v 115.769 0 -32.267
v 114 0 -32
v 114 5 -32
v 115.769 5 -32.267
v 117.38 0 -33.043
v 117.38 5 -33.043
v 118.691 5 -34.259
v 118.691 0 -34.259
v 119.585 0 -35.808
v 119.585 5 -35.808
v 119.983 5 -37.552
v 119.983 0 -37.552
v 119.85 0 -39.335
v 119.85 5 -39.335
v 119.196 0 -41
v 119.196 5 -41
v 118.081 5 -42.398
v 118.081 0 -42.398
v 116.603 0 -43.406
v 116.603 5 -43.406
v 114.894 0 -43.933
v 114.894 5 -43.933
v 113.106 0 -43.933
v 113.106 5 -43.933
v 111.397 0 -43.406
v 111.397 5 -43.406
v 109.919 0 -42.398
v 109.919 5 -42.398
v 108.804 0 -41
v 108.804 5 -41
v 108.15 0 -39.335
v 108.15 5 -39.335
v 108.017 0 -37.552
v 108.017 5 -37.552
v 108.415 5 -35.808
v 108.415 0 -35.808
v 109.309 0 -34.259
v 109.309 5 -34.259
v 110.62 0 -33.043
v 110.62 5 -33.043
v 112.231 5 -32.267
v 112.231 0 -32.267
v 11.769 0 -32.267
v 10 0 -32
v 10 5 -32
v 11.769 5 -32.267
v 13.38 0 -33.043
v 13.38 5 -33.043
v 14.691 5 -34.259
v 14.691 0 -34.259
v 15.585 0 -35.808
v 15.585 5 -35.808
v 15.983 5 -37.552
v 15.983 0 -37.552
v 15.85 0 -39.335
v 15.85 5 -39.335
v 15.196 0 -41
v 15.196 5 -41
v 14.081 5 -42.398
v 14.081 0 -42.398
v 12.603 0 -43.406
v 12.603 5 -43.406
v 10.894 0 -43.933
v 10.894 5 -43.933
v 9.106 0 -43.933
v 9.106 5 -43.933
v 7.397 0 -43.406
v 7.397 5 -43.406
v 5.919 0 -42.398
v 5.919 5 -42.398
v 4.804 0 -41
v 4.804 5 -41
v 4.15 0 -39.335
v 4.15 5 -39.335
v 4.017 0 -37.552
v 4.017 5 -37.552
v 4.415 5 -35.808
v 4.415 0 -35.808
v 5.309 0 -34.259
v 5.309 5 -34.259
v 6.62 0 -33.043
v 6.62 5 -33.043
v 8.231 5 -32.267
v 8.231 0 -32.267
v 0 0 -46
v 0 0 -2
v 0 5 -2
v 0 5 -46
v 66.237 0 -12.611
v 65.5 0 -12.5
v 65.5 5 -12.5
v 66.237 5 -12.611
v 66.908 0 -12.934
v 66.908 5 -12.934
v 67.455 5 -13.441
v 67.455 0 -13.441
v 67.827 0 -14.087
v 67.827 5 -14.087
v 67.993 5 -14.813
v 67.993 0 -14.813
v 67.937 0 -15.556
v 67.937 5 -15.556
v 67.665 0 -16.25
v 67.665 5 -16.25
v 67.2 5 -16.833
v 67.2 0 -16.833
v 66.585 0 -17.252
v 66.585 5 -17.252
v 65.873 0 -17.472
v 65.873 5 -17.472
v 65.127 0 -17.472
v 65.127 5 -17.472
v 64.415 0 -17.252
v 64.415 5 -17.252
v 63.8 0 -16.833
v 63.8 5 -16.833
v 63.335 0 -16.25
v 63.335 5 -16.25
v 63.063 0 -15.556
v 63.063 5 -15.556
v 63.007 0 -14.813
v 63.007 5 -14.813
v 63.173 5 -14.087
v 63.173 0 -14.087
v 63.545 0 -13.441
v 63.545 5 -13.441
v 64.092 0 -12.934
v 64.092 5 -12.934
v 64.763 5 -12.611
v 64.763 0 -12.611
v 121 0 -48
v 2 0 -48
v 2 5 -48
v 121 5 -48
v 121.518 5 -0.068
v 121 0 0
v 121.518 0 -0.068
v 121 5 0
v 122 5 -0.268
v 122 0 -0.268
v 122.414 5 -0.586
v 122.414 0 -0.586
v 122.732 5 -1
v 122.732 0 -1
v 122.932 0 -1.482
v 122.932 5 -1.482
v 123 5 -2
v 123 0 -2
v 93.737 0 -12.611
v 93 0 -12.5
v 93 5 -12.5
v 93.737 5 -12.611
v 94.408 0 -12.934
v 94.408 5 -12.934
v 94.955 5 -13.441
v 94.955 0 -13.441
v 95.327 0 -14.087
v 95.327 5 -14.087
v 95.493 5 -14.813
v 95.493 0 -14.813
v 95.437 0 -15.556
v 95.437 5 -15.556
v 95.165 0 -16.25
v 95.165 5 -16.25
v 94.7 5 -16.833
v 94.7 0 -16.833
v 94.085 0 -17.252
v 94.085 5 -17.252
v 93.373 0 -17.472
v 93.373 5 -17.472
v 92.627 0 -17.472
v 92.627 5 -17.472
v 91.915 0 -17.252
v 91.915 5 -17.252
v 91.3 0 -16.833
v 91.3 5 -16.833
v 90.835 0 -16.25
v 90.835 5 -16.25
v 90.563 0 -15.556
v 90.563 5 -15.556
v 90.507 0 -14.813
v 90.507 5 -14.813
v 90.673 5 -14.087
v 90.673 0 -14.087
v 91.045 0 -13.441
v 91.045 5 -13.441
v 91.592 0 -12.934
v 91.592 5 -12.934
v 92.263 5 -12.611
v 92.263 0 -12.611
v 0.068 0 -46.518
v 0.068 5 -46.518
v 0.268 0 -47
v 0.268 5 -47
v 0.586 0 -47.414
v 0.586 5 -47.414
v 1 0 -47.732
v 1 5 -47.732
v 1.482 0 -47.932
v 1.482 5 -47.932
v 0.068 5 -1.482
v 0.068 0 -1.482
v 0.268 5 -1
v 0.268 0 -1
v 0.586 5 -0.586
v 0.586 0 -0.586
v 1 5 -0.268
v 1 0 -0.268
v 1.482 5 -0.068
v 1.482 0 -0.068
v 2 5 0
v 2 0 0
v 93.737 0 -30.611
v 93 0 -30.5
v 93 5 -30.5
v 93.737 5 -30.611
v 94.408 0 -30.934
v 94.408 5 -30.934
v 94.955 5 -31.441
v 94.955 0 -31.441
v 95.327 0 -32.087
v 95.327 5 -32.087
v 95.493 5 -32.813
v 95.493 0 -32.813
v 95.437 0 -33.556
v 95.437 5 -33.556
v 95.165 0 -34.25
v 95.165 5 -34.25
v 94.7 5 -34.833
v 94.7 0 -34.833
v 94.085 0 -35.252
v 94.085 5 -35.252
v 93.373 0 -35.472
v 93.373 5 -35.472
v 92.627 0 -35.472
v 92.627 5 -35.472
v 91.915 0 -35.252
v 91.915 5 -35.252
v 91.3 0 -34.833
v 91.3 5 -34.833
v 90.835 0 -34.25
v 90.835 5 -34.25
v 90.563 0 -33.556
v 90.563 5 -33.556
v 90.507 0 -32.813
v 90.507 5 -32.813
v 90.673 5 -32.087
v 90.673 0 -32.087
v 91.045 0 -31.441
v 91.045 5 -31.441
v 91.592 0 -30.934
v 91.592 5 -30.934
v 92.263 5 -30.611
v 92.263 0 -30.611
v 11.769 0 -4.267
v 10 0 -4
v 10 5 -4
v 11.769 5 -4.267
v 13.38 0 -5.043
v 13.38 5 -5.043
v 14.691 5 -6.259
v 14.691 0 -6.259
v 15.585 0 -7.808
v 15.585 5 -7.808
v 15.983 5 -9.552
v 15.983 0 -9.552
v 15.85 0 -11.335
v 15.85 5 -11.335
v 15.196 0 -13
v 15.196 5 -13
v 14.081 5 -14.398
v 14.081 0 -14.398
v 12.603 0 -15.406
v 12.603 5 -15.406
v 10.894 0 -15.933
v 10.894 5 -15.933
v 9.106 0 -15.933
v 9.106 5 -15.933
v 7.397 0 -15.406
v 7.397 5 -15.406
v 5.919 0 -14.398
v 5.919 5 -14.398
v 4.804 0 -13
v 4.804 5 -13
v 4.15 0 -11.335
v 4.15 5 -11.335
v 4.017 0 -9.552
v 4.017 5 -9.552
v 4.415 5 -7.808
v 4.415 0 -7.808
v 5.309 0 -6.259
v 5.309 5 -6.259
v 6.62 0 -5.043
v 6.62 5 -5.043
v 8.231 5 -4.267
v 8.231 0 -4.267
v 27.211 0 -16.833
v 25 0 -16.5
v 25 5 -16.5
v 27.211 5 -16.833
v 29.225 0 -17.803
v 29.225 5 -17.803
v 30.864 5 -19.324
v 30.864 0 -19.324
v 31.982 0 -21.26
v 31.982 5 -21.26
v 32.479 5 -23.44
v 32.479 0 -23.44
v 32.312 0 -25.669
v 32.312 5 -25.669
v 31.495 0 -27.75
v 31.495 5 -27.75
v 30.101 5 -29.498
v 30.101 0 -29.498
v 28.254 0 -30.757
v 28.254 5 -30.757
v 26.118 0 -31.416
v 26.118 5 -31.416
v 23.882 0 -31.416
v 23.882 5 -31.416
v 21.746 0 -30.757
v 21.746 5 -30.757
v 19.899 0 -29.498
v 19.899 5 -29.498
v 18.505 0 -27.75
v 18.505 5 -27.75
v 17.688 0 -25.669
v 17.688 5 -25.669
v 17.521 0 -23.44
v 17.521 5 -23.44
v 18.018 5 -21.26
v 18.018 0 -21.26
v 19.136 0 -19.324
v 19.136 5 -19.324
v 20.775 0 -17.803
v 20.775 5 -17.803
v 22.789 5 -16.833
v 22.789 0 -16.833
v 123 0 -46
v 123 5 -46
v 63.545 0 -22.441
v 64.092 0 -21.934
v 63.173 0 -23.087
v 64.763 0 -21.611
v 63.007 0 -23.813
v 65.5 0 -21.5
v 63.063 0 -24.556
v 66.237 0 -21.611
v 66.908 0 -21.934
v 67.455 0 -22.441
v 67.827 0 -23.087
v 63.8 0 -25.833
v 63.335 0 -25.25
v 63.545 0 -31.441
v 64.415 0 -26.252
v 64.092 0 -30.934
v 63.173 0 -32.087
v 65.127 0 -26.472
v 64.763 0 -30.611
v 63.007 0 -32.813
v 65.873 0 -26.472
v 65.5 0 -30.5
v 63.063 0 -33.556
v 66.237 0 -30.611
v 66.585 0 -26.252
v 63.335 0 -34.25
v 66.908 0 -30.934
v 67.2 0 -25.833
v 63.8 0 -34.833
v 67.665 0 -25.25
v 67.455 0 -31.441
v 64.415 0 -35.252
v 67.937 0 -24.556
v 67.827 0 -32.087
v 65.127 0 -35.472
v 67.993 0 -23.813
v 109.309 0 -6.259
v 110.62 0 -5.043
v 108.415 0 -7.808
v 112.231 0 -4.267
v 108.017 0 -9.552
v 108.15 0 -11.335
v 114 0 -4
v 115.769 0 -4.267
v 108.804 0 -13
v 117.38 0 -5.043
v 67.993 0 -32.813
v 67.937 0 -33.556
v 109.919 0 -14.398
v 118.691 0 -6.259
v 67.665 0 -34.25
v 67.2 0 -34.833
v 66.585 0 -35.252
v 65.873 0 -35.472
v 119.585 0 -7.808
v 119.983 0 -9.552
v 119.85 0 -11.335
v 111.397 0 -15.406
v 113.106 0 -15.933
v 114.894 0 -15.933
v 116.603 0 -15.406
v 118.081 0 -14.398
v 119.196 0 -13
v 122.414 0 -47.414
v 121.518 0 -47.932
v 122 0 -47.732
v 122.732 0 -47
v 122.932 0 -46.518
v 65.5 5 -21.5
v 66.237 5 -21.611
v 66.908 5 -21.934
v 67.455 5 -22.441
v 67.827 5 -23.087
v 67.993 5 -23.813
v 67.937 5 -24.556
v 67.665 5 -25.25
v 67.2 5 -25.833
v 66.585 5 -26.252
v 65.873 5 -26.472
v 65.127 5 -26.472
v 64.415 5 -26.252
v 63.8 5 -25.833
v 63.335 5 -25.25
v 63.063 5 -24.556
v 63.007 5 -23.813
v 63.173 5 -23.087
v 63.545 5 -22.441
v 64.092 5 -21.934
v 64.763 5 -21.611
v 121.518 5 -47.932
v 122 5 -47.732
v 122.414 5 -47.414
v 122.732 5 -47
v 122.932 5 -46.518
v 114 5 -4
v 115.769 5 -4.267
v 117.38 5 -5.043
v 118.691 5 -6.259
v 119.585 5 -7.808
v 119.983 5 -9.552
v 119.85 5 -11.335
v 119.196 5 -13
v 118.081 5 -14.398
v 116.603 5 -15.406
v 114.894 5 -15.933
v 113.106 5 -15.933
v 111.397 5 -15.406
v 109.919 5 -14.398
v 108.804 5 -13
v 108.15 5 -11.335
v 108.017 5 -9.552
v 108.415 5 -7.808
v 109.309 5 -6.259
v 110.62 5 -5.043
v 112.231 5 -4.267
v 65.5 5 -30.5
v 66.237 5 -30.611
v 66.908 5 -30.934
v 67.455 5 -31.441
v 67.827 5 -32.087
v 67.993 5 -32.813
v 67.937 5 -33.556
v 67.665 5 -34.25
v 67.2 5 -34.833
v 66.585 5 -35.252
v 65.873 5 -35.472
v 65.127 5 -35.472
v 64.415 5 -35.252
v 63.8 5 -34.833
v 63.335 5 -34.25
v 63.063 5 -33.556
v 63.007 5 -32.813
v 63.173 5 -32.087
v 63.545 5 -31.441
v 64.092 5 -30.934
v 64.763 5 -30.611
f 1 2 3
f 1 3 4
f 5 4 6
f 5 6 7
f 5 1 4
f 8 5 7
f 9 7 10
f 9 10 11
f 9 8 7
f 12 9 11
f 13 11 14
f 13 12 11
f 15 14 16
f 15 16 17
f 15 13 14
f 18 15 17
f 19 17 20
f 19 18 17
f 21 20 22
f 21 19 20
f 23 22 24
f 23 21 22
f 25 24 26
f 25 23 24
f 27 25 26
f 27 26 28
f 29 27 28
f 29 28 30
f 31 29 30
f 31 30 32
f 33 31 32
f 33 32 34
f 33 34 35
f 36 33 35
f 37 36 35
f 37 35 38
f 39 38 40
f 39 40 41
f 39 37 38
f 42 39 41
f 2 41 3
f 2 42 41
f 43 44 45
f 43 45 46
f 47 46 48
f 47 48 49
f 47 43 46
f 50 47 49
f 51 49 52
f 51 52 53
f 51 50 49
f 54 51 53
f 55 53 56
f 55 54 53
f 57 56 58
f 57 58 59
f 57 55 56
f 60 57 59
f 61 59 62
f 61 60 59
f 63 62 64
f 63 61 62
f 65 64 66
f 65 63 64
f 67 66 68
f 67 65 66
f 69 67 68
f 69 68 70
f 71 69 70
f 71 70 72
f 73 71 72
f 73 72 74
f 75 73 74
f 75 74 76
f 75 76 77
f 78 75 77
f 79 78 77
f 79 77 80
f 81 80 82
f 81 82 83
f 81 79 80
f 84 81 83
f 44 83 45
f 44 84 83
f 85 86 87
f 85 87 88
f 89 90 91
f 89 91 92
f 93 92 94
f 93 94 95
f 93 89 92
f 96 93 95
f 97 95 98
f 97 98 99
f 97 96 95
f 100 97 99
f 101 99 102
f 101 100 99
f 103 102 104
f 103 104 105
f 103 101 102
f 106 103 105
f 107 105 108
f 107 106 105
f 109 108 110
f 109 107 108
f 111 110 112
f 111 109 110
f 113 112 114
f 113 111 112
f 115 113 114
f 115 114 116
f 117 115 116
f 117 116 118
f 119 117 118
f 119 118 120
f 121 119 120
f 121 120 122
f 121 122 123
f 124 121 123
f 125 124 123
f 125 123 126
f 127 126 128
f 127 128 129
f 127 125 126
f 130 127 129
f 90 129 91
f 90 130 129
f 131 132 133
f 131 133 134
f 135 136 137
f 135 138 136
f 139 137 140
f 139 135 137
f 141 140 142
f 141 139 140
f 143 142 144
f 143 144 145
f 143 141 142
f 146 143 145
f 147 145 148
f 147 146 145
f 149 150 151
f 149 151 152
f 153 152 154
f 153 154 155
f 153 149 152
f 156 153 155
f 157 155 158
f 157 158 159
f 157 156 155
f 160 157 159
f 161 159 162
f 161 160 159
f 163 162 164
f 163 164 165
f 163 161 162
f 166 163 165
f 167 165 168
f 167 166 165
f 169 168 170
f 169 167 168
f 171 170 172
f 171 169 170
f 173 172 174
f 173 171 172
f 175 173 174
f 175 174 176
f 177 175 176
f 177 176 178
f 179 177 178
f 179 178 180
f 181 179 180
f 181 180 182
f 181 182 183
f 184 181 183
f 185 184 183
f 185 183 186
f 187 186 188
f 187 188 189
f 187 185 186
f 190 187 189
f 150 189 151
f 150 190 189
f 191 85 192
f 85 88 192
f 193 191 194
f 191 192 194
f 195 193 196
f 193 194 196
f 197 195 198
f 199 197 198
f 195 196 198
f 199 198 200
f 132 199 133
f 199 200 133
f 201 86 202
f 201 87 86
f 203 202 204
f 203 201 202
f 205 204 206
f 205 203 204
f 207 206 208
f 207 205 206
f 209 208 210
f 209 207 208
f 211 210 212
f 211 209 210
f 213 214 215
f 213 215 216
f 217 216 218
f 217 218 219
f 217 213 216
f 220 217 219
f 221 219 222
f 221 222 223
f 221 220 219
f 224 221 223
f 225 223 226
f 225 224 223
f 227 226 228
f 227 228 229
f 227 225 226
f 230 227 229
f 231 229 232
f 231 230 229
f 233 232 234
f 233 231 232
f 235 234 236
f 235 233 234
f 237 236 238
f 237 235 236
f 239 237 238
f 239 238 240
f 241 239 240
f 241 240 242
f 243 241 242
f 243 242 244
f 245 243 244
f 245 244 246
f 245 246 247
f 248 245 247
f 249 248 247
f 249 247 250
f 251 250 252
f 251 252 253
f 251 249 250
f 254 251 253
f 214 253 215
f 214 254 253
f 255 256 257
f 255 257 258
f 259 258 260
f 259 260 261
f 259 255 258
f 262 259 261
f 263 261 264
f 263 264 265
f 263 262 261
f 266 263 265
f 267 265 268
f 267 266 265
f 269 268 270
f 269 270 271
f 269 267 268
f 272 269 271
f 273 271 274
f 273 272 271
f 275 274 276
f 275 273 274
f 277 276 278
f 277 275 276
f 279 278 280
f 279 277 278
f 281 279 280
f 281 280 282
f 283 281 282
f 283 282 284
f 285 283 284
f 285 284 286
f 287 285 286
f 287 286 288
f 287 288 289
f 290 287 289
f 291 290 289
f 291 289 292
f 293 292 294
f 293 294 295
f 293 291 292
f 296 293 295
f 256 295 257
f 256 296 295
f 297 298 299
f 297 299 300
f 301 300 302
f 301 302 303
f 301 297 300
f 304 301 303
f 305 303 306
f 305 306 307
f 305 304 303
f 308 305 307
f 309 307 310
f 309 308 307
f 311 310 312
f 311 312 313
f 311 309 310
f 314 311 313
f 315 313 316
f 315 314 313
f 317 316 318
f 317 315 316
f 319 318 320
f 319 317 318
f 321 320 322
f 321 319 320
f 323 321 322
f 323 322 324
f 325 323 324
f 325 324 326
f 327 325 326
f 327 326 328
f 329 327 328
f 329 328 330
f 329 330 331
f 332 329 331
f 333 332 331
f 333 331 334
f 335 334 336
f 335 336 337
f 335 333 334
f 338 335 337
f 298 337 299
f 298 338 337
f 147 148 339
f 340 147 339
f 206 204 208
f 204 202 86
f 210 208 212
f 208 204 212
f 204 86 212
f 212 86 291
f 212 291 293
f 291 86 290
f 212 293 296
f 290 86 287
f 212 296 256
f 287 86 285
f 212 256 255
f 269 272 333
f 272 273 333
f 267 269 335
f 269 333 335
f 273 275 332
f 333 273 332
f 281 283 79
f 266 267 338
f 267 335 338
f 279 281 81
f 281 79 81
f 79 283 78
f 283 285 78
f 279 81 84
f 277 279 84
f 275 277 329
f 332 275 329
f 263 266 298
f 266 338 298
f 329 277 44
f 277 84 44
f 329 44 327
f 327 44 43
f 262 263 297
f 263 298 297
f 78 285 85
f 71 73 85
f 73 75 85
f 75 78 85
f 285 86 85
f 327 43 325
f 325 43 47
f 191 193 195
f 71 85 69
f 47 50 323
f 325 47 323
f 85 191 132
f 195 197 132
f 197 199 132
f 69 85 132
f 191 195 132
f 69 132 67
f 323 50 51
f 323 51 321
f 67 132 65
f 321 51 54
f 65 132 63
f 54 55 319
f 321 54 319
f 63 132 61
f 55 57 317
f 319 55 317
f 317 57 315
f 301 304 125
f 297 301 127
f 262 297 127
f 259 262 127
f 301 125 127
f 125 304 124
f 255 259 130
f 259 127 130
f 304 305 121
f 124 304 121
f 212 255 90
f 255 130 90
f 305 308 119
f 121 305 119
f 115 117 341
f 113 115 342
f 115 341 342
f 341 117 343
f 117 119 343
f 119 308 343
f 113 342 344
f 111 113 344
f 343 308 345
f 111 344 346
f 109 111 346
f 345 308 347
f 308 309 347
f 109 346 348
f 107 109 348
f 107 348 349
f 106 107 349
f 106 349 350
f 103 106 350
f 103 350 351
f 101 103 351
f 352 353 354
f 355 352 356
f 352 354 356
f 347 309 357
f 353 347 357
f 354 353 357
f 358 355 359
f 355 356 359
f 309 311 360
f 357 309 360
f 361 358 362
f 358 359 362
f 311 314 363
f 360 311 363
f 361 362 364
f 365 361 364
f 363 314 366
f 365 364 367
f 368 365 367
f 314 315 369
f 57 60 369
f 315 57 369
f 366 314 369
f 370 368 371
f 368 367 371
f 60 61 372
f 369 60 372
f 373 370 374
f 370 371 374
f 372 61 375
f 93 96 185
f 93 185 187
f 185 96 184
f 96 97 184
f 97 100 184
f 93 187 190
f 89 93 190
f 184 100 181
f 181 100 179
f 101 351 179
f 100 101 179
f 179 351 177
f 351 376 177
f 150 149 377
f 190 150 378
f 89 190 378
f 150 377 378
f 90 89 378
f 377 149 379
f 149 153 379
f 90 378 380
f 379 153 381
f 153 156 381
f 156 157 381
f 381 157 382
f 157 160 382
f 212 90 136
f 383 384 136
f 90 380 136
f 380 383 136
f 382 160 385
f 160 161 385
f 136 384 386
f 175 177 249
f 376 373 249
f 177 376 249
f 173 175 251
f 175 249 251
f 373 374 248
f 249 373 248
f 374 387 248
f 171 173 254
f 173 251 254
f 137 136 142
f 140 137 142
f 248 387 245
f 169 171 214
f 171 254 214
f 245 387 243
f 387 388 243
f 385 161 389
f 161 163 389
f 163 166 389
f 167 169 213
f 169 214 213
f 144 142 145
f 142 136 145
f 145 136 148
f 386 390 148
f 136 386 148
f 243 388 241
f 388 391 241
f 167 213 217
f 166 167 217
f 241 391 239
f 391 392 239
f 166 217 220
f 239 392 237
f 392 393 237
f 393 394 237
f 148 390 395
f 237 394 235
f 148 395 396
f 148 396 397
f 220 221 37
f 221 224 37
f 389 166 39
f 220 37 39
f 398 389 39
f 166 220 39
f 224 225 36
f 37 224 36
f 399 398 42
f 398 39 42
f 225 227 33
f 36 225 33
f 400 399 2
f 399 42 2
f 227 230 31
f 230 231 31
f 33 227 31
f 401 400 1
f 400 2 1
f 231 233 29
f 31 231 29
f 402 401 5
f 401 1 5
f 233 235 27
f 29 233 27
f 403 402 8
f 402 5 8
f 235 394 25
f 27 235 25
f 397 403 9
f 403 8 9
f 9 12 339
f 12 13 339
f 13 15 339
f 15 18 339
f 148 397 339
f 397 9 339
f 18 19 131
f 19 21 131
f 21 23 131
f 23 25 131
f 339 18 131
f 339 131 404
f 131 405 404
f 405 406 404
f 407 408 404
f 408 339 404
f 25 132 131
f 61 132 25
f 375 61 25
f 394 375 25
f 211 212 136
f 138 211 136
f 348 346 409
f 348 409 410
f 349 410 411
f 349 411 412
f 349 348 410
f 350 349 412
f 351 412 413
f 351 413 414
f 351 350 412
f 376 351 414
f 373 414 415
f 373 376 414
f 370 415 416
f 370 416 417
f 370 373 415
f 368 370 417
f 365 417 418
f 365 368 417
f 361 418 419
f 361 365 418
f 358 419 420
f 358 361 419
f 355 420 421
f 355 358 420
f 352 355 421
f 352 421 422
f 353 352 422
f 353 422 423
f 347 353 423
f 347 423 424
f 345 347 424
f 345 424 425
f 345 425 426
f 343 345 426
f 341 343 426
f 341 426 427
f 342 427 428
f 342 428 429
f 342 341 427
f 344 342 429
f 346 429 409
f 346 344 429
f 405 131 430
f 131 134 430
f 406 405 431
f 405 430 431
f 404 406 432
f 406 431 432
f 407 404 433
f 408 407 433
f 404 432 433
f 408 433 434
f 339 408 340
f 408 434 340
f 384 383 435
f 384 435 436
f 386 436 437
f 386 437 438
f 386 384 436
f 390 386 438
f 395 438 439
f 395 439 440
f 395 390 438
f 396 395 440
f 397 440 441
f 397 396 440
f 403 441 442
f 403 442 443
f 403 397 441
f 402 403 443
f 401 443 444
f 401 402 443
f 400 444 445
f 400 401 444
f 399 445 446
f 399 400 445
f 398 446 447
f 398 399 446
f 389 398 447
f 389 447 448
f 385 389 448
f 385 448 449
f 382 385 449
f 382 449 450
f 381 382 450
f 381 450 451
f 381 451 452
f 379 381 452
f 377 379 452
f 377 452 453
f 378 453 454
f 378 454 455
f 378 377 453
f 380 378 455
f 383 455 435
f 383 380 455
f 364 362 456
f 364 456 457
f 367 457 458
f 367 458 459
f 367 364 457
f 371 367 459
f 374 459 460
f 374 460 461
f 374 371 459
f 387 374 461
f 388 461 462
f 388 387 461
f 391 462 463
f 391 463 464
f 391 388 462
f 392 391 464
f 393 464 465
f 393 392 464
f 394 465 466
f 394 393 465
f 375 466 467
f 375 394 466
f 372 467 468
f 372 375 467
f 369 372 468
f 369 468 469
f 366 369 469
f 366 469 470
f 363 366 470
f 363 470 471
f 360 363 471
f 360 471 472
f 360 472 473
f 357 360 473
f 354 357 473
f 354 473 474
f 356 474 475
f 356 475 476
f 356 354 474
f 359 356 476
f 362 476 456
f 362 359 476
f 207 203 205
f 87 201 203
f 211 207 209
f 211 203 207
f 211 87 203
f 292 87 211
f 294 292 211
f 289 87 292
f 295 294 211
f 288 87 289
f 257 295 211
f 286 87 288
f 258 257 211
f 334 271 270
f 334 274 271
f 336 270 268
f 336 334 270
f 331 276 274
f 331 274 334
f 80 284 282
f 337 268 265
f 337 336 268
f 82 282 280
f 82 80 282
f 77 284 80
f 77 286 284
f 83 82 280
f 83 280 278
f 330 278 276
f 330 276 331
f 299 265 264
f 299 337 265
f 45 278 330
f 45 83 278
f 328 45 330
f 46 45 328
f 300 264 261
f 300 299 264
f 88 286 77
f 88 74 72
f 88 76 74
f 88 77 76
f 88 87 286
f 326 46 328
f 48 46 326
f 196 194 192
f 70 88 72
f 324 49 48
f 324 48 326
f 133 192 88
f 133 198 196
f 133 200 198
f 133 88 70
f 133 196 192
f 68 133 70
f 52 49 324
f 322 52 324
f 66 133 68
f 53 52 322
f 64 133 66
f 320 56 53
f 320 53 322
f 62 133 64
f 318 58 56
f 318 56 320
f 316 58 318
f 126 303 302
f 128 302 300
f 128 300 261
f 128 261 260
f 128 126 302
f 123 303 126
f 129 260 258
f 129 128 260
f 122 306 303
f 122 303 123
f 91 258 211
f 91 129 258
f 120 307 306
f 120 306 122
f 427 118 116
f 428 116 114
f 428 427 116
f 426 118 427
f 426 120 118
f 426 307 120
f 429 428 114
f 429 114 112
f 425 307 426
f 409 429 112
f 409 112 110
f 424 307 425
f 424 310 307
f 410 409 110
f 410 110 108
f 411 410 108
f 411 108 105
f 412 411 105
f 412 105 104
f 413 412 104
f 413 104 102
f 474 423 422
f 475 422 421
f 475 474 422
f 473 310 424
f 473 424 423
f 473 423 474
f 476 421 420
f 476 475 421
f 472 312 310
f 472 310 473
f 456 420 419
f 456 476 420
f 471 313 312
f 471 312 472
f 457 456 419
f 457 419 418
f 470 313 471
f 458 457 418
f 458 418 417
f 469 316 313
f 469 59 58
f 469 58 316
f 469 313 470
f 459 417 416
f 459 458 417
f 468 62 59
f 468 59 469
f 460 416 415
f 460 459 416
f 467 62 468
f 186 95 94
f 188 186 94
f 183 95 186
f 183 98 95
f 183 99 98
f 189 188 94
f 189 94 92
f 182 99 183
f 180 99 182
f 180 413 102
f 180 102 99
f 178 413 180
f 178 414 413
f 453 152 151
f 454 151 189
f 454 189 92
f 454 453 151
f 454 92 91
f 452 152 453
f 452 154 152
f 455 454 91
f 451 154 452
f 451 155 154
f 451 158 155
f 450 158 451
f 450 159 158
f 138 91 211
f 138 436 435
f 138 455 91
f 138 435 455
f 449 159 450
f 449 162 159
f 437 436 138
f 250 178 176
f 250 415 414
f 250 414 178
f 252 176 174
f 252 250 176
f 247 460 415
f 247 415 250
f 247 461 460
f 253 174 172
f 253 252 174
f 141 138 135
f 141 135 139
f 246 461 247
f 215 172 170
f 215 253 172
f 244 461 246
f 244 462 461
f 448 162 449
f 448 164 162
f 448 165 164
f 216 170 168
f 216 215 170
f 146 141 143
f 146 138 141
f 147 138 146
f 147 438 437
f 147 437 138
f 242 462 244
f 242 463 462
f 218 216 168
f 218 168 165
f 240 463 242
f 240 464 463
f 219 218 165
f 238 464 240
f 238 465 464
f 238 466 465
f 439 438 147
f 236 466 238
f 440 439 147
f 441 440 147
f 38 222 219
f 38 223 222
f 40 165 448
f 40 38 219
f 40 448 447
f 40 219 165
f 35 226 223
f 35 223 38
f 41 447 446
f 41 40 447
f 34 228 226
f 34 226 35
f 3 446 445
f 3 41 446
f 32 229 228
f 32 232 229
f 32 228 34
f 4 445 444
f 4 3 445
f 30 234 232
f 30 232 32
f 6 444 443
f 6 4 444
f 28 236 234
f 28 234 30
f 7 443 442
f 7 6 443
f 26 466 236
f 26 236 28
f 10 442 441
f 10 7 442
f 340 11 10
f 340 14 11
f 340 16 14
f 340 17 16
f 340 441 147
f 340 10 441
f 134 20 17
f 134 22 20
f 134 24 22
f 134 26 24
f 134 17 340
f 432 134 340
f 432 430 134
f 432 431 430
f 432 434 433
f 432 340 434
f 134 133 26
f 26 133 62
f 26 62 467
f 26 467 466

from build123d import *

# Parameters (mm, degrees)
SKETCH1_W           = 123
SKETCH1_H           = 48
SKETCH1_R           = 6
SKETCH1_R_2         = 7.5
SKETCH1_R_3         = 2.5
BOSS_EXTRUDE1_DEPTH = 5
FILLET1_R           = 2


with BuildPart() as part:
    # Sketch1 → Boss-Extrude1 (new body)
    with BuildSketch(Plane(origin=(0, 0, 0), x_dir=(1, 0, 0), z_dir=(0, 1, 0))):
        with Locations((61.5, 24)):
            Rectangle(SKETCH1_W, SKETCH1_H)
        with Locations(Location((10, 10, 0), (0, 0, 270))):
            Circle(SKETCH1_R, mode=Mode.SUBTRACT)
        with Locations(Location((10, 38, 0), (0, 0, 270))):
            Circle(SKETCH1_R, mode=Mode.SUBTRACT)
        with Locations(Location((114, 38, 0), (0, 0, 270))):
            Circle(SKETCH1_R, mode=Mode.SUBTRACT)
        with Locations(Location((114, 10, 0), (0, 0, 270))):
            Circle(SKETCH1_R, mode=Mode.SUBTRACT)
        with Locations(Location((25, 24, 0), (0, 0, 270))):
            Circle(SKETCH1_R_2, mode=Mode.SUBTRACT)
        with Locations(Location((93, 15, 0), (0, 0, 270))):
            Circle(SKETCH1_R_3, mode=Mode.SUBTRACT)
        with Locations(Location((93, 33, 0), (0, 0, 270))):
            Circle(SKETCH1_R_3, mode=Mode.SUBTRACT)
        with Locations(Location((65.5, 15, 0), (0, 0, 270))):
            Circle(SKETCH1_R_3, mode=Mode.SUBTRACT)
        with Locations(Location((65.5, 24, 0), (0, 0, 270))):
            Circle(SKETCH1_R_3, mode=Mode.SUBTRACT)
        with Locations(Location((65.5, 33, 0), (0, 0, 270))):
            Circle(SKETCH1_R_3, mode=Mode.SUBTRACT)
    extrude(amount=BOSS_EXTRUDE1_DEPTH)

    # Fillet1
    fillet1_edges = [part.edges().sort_by_distance(p)[0] for p in [
        (0, 2.5, -48),
        (123, 2.5, -48),
        (123, 2.5, 0),
        (0, 2.5, 0),
    ]]
    fillet(fillet1_edges, radius=FILLET1_R)


solid = part.part
